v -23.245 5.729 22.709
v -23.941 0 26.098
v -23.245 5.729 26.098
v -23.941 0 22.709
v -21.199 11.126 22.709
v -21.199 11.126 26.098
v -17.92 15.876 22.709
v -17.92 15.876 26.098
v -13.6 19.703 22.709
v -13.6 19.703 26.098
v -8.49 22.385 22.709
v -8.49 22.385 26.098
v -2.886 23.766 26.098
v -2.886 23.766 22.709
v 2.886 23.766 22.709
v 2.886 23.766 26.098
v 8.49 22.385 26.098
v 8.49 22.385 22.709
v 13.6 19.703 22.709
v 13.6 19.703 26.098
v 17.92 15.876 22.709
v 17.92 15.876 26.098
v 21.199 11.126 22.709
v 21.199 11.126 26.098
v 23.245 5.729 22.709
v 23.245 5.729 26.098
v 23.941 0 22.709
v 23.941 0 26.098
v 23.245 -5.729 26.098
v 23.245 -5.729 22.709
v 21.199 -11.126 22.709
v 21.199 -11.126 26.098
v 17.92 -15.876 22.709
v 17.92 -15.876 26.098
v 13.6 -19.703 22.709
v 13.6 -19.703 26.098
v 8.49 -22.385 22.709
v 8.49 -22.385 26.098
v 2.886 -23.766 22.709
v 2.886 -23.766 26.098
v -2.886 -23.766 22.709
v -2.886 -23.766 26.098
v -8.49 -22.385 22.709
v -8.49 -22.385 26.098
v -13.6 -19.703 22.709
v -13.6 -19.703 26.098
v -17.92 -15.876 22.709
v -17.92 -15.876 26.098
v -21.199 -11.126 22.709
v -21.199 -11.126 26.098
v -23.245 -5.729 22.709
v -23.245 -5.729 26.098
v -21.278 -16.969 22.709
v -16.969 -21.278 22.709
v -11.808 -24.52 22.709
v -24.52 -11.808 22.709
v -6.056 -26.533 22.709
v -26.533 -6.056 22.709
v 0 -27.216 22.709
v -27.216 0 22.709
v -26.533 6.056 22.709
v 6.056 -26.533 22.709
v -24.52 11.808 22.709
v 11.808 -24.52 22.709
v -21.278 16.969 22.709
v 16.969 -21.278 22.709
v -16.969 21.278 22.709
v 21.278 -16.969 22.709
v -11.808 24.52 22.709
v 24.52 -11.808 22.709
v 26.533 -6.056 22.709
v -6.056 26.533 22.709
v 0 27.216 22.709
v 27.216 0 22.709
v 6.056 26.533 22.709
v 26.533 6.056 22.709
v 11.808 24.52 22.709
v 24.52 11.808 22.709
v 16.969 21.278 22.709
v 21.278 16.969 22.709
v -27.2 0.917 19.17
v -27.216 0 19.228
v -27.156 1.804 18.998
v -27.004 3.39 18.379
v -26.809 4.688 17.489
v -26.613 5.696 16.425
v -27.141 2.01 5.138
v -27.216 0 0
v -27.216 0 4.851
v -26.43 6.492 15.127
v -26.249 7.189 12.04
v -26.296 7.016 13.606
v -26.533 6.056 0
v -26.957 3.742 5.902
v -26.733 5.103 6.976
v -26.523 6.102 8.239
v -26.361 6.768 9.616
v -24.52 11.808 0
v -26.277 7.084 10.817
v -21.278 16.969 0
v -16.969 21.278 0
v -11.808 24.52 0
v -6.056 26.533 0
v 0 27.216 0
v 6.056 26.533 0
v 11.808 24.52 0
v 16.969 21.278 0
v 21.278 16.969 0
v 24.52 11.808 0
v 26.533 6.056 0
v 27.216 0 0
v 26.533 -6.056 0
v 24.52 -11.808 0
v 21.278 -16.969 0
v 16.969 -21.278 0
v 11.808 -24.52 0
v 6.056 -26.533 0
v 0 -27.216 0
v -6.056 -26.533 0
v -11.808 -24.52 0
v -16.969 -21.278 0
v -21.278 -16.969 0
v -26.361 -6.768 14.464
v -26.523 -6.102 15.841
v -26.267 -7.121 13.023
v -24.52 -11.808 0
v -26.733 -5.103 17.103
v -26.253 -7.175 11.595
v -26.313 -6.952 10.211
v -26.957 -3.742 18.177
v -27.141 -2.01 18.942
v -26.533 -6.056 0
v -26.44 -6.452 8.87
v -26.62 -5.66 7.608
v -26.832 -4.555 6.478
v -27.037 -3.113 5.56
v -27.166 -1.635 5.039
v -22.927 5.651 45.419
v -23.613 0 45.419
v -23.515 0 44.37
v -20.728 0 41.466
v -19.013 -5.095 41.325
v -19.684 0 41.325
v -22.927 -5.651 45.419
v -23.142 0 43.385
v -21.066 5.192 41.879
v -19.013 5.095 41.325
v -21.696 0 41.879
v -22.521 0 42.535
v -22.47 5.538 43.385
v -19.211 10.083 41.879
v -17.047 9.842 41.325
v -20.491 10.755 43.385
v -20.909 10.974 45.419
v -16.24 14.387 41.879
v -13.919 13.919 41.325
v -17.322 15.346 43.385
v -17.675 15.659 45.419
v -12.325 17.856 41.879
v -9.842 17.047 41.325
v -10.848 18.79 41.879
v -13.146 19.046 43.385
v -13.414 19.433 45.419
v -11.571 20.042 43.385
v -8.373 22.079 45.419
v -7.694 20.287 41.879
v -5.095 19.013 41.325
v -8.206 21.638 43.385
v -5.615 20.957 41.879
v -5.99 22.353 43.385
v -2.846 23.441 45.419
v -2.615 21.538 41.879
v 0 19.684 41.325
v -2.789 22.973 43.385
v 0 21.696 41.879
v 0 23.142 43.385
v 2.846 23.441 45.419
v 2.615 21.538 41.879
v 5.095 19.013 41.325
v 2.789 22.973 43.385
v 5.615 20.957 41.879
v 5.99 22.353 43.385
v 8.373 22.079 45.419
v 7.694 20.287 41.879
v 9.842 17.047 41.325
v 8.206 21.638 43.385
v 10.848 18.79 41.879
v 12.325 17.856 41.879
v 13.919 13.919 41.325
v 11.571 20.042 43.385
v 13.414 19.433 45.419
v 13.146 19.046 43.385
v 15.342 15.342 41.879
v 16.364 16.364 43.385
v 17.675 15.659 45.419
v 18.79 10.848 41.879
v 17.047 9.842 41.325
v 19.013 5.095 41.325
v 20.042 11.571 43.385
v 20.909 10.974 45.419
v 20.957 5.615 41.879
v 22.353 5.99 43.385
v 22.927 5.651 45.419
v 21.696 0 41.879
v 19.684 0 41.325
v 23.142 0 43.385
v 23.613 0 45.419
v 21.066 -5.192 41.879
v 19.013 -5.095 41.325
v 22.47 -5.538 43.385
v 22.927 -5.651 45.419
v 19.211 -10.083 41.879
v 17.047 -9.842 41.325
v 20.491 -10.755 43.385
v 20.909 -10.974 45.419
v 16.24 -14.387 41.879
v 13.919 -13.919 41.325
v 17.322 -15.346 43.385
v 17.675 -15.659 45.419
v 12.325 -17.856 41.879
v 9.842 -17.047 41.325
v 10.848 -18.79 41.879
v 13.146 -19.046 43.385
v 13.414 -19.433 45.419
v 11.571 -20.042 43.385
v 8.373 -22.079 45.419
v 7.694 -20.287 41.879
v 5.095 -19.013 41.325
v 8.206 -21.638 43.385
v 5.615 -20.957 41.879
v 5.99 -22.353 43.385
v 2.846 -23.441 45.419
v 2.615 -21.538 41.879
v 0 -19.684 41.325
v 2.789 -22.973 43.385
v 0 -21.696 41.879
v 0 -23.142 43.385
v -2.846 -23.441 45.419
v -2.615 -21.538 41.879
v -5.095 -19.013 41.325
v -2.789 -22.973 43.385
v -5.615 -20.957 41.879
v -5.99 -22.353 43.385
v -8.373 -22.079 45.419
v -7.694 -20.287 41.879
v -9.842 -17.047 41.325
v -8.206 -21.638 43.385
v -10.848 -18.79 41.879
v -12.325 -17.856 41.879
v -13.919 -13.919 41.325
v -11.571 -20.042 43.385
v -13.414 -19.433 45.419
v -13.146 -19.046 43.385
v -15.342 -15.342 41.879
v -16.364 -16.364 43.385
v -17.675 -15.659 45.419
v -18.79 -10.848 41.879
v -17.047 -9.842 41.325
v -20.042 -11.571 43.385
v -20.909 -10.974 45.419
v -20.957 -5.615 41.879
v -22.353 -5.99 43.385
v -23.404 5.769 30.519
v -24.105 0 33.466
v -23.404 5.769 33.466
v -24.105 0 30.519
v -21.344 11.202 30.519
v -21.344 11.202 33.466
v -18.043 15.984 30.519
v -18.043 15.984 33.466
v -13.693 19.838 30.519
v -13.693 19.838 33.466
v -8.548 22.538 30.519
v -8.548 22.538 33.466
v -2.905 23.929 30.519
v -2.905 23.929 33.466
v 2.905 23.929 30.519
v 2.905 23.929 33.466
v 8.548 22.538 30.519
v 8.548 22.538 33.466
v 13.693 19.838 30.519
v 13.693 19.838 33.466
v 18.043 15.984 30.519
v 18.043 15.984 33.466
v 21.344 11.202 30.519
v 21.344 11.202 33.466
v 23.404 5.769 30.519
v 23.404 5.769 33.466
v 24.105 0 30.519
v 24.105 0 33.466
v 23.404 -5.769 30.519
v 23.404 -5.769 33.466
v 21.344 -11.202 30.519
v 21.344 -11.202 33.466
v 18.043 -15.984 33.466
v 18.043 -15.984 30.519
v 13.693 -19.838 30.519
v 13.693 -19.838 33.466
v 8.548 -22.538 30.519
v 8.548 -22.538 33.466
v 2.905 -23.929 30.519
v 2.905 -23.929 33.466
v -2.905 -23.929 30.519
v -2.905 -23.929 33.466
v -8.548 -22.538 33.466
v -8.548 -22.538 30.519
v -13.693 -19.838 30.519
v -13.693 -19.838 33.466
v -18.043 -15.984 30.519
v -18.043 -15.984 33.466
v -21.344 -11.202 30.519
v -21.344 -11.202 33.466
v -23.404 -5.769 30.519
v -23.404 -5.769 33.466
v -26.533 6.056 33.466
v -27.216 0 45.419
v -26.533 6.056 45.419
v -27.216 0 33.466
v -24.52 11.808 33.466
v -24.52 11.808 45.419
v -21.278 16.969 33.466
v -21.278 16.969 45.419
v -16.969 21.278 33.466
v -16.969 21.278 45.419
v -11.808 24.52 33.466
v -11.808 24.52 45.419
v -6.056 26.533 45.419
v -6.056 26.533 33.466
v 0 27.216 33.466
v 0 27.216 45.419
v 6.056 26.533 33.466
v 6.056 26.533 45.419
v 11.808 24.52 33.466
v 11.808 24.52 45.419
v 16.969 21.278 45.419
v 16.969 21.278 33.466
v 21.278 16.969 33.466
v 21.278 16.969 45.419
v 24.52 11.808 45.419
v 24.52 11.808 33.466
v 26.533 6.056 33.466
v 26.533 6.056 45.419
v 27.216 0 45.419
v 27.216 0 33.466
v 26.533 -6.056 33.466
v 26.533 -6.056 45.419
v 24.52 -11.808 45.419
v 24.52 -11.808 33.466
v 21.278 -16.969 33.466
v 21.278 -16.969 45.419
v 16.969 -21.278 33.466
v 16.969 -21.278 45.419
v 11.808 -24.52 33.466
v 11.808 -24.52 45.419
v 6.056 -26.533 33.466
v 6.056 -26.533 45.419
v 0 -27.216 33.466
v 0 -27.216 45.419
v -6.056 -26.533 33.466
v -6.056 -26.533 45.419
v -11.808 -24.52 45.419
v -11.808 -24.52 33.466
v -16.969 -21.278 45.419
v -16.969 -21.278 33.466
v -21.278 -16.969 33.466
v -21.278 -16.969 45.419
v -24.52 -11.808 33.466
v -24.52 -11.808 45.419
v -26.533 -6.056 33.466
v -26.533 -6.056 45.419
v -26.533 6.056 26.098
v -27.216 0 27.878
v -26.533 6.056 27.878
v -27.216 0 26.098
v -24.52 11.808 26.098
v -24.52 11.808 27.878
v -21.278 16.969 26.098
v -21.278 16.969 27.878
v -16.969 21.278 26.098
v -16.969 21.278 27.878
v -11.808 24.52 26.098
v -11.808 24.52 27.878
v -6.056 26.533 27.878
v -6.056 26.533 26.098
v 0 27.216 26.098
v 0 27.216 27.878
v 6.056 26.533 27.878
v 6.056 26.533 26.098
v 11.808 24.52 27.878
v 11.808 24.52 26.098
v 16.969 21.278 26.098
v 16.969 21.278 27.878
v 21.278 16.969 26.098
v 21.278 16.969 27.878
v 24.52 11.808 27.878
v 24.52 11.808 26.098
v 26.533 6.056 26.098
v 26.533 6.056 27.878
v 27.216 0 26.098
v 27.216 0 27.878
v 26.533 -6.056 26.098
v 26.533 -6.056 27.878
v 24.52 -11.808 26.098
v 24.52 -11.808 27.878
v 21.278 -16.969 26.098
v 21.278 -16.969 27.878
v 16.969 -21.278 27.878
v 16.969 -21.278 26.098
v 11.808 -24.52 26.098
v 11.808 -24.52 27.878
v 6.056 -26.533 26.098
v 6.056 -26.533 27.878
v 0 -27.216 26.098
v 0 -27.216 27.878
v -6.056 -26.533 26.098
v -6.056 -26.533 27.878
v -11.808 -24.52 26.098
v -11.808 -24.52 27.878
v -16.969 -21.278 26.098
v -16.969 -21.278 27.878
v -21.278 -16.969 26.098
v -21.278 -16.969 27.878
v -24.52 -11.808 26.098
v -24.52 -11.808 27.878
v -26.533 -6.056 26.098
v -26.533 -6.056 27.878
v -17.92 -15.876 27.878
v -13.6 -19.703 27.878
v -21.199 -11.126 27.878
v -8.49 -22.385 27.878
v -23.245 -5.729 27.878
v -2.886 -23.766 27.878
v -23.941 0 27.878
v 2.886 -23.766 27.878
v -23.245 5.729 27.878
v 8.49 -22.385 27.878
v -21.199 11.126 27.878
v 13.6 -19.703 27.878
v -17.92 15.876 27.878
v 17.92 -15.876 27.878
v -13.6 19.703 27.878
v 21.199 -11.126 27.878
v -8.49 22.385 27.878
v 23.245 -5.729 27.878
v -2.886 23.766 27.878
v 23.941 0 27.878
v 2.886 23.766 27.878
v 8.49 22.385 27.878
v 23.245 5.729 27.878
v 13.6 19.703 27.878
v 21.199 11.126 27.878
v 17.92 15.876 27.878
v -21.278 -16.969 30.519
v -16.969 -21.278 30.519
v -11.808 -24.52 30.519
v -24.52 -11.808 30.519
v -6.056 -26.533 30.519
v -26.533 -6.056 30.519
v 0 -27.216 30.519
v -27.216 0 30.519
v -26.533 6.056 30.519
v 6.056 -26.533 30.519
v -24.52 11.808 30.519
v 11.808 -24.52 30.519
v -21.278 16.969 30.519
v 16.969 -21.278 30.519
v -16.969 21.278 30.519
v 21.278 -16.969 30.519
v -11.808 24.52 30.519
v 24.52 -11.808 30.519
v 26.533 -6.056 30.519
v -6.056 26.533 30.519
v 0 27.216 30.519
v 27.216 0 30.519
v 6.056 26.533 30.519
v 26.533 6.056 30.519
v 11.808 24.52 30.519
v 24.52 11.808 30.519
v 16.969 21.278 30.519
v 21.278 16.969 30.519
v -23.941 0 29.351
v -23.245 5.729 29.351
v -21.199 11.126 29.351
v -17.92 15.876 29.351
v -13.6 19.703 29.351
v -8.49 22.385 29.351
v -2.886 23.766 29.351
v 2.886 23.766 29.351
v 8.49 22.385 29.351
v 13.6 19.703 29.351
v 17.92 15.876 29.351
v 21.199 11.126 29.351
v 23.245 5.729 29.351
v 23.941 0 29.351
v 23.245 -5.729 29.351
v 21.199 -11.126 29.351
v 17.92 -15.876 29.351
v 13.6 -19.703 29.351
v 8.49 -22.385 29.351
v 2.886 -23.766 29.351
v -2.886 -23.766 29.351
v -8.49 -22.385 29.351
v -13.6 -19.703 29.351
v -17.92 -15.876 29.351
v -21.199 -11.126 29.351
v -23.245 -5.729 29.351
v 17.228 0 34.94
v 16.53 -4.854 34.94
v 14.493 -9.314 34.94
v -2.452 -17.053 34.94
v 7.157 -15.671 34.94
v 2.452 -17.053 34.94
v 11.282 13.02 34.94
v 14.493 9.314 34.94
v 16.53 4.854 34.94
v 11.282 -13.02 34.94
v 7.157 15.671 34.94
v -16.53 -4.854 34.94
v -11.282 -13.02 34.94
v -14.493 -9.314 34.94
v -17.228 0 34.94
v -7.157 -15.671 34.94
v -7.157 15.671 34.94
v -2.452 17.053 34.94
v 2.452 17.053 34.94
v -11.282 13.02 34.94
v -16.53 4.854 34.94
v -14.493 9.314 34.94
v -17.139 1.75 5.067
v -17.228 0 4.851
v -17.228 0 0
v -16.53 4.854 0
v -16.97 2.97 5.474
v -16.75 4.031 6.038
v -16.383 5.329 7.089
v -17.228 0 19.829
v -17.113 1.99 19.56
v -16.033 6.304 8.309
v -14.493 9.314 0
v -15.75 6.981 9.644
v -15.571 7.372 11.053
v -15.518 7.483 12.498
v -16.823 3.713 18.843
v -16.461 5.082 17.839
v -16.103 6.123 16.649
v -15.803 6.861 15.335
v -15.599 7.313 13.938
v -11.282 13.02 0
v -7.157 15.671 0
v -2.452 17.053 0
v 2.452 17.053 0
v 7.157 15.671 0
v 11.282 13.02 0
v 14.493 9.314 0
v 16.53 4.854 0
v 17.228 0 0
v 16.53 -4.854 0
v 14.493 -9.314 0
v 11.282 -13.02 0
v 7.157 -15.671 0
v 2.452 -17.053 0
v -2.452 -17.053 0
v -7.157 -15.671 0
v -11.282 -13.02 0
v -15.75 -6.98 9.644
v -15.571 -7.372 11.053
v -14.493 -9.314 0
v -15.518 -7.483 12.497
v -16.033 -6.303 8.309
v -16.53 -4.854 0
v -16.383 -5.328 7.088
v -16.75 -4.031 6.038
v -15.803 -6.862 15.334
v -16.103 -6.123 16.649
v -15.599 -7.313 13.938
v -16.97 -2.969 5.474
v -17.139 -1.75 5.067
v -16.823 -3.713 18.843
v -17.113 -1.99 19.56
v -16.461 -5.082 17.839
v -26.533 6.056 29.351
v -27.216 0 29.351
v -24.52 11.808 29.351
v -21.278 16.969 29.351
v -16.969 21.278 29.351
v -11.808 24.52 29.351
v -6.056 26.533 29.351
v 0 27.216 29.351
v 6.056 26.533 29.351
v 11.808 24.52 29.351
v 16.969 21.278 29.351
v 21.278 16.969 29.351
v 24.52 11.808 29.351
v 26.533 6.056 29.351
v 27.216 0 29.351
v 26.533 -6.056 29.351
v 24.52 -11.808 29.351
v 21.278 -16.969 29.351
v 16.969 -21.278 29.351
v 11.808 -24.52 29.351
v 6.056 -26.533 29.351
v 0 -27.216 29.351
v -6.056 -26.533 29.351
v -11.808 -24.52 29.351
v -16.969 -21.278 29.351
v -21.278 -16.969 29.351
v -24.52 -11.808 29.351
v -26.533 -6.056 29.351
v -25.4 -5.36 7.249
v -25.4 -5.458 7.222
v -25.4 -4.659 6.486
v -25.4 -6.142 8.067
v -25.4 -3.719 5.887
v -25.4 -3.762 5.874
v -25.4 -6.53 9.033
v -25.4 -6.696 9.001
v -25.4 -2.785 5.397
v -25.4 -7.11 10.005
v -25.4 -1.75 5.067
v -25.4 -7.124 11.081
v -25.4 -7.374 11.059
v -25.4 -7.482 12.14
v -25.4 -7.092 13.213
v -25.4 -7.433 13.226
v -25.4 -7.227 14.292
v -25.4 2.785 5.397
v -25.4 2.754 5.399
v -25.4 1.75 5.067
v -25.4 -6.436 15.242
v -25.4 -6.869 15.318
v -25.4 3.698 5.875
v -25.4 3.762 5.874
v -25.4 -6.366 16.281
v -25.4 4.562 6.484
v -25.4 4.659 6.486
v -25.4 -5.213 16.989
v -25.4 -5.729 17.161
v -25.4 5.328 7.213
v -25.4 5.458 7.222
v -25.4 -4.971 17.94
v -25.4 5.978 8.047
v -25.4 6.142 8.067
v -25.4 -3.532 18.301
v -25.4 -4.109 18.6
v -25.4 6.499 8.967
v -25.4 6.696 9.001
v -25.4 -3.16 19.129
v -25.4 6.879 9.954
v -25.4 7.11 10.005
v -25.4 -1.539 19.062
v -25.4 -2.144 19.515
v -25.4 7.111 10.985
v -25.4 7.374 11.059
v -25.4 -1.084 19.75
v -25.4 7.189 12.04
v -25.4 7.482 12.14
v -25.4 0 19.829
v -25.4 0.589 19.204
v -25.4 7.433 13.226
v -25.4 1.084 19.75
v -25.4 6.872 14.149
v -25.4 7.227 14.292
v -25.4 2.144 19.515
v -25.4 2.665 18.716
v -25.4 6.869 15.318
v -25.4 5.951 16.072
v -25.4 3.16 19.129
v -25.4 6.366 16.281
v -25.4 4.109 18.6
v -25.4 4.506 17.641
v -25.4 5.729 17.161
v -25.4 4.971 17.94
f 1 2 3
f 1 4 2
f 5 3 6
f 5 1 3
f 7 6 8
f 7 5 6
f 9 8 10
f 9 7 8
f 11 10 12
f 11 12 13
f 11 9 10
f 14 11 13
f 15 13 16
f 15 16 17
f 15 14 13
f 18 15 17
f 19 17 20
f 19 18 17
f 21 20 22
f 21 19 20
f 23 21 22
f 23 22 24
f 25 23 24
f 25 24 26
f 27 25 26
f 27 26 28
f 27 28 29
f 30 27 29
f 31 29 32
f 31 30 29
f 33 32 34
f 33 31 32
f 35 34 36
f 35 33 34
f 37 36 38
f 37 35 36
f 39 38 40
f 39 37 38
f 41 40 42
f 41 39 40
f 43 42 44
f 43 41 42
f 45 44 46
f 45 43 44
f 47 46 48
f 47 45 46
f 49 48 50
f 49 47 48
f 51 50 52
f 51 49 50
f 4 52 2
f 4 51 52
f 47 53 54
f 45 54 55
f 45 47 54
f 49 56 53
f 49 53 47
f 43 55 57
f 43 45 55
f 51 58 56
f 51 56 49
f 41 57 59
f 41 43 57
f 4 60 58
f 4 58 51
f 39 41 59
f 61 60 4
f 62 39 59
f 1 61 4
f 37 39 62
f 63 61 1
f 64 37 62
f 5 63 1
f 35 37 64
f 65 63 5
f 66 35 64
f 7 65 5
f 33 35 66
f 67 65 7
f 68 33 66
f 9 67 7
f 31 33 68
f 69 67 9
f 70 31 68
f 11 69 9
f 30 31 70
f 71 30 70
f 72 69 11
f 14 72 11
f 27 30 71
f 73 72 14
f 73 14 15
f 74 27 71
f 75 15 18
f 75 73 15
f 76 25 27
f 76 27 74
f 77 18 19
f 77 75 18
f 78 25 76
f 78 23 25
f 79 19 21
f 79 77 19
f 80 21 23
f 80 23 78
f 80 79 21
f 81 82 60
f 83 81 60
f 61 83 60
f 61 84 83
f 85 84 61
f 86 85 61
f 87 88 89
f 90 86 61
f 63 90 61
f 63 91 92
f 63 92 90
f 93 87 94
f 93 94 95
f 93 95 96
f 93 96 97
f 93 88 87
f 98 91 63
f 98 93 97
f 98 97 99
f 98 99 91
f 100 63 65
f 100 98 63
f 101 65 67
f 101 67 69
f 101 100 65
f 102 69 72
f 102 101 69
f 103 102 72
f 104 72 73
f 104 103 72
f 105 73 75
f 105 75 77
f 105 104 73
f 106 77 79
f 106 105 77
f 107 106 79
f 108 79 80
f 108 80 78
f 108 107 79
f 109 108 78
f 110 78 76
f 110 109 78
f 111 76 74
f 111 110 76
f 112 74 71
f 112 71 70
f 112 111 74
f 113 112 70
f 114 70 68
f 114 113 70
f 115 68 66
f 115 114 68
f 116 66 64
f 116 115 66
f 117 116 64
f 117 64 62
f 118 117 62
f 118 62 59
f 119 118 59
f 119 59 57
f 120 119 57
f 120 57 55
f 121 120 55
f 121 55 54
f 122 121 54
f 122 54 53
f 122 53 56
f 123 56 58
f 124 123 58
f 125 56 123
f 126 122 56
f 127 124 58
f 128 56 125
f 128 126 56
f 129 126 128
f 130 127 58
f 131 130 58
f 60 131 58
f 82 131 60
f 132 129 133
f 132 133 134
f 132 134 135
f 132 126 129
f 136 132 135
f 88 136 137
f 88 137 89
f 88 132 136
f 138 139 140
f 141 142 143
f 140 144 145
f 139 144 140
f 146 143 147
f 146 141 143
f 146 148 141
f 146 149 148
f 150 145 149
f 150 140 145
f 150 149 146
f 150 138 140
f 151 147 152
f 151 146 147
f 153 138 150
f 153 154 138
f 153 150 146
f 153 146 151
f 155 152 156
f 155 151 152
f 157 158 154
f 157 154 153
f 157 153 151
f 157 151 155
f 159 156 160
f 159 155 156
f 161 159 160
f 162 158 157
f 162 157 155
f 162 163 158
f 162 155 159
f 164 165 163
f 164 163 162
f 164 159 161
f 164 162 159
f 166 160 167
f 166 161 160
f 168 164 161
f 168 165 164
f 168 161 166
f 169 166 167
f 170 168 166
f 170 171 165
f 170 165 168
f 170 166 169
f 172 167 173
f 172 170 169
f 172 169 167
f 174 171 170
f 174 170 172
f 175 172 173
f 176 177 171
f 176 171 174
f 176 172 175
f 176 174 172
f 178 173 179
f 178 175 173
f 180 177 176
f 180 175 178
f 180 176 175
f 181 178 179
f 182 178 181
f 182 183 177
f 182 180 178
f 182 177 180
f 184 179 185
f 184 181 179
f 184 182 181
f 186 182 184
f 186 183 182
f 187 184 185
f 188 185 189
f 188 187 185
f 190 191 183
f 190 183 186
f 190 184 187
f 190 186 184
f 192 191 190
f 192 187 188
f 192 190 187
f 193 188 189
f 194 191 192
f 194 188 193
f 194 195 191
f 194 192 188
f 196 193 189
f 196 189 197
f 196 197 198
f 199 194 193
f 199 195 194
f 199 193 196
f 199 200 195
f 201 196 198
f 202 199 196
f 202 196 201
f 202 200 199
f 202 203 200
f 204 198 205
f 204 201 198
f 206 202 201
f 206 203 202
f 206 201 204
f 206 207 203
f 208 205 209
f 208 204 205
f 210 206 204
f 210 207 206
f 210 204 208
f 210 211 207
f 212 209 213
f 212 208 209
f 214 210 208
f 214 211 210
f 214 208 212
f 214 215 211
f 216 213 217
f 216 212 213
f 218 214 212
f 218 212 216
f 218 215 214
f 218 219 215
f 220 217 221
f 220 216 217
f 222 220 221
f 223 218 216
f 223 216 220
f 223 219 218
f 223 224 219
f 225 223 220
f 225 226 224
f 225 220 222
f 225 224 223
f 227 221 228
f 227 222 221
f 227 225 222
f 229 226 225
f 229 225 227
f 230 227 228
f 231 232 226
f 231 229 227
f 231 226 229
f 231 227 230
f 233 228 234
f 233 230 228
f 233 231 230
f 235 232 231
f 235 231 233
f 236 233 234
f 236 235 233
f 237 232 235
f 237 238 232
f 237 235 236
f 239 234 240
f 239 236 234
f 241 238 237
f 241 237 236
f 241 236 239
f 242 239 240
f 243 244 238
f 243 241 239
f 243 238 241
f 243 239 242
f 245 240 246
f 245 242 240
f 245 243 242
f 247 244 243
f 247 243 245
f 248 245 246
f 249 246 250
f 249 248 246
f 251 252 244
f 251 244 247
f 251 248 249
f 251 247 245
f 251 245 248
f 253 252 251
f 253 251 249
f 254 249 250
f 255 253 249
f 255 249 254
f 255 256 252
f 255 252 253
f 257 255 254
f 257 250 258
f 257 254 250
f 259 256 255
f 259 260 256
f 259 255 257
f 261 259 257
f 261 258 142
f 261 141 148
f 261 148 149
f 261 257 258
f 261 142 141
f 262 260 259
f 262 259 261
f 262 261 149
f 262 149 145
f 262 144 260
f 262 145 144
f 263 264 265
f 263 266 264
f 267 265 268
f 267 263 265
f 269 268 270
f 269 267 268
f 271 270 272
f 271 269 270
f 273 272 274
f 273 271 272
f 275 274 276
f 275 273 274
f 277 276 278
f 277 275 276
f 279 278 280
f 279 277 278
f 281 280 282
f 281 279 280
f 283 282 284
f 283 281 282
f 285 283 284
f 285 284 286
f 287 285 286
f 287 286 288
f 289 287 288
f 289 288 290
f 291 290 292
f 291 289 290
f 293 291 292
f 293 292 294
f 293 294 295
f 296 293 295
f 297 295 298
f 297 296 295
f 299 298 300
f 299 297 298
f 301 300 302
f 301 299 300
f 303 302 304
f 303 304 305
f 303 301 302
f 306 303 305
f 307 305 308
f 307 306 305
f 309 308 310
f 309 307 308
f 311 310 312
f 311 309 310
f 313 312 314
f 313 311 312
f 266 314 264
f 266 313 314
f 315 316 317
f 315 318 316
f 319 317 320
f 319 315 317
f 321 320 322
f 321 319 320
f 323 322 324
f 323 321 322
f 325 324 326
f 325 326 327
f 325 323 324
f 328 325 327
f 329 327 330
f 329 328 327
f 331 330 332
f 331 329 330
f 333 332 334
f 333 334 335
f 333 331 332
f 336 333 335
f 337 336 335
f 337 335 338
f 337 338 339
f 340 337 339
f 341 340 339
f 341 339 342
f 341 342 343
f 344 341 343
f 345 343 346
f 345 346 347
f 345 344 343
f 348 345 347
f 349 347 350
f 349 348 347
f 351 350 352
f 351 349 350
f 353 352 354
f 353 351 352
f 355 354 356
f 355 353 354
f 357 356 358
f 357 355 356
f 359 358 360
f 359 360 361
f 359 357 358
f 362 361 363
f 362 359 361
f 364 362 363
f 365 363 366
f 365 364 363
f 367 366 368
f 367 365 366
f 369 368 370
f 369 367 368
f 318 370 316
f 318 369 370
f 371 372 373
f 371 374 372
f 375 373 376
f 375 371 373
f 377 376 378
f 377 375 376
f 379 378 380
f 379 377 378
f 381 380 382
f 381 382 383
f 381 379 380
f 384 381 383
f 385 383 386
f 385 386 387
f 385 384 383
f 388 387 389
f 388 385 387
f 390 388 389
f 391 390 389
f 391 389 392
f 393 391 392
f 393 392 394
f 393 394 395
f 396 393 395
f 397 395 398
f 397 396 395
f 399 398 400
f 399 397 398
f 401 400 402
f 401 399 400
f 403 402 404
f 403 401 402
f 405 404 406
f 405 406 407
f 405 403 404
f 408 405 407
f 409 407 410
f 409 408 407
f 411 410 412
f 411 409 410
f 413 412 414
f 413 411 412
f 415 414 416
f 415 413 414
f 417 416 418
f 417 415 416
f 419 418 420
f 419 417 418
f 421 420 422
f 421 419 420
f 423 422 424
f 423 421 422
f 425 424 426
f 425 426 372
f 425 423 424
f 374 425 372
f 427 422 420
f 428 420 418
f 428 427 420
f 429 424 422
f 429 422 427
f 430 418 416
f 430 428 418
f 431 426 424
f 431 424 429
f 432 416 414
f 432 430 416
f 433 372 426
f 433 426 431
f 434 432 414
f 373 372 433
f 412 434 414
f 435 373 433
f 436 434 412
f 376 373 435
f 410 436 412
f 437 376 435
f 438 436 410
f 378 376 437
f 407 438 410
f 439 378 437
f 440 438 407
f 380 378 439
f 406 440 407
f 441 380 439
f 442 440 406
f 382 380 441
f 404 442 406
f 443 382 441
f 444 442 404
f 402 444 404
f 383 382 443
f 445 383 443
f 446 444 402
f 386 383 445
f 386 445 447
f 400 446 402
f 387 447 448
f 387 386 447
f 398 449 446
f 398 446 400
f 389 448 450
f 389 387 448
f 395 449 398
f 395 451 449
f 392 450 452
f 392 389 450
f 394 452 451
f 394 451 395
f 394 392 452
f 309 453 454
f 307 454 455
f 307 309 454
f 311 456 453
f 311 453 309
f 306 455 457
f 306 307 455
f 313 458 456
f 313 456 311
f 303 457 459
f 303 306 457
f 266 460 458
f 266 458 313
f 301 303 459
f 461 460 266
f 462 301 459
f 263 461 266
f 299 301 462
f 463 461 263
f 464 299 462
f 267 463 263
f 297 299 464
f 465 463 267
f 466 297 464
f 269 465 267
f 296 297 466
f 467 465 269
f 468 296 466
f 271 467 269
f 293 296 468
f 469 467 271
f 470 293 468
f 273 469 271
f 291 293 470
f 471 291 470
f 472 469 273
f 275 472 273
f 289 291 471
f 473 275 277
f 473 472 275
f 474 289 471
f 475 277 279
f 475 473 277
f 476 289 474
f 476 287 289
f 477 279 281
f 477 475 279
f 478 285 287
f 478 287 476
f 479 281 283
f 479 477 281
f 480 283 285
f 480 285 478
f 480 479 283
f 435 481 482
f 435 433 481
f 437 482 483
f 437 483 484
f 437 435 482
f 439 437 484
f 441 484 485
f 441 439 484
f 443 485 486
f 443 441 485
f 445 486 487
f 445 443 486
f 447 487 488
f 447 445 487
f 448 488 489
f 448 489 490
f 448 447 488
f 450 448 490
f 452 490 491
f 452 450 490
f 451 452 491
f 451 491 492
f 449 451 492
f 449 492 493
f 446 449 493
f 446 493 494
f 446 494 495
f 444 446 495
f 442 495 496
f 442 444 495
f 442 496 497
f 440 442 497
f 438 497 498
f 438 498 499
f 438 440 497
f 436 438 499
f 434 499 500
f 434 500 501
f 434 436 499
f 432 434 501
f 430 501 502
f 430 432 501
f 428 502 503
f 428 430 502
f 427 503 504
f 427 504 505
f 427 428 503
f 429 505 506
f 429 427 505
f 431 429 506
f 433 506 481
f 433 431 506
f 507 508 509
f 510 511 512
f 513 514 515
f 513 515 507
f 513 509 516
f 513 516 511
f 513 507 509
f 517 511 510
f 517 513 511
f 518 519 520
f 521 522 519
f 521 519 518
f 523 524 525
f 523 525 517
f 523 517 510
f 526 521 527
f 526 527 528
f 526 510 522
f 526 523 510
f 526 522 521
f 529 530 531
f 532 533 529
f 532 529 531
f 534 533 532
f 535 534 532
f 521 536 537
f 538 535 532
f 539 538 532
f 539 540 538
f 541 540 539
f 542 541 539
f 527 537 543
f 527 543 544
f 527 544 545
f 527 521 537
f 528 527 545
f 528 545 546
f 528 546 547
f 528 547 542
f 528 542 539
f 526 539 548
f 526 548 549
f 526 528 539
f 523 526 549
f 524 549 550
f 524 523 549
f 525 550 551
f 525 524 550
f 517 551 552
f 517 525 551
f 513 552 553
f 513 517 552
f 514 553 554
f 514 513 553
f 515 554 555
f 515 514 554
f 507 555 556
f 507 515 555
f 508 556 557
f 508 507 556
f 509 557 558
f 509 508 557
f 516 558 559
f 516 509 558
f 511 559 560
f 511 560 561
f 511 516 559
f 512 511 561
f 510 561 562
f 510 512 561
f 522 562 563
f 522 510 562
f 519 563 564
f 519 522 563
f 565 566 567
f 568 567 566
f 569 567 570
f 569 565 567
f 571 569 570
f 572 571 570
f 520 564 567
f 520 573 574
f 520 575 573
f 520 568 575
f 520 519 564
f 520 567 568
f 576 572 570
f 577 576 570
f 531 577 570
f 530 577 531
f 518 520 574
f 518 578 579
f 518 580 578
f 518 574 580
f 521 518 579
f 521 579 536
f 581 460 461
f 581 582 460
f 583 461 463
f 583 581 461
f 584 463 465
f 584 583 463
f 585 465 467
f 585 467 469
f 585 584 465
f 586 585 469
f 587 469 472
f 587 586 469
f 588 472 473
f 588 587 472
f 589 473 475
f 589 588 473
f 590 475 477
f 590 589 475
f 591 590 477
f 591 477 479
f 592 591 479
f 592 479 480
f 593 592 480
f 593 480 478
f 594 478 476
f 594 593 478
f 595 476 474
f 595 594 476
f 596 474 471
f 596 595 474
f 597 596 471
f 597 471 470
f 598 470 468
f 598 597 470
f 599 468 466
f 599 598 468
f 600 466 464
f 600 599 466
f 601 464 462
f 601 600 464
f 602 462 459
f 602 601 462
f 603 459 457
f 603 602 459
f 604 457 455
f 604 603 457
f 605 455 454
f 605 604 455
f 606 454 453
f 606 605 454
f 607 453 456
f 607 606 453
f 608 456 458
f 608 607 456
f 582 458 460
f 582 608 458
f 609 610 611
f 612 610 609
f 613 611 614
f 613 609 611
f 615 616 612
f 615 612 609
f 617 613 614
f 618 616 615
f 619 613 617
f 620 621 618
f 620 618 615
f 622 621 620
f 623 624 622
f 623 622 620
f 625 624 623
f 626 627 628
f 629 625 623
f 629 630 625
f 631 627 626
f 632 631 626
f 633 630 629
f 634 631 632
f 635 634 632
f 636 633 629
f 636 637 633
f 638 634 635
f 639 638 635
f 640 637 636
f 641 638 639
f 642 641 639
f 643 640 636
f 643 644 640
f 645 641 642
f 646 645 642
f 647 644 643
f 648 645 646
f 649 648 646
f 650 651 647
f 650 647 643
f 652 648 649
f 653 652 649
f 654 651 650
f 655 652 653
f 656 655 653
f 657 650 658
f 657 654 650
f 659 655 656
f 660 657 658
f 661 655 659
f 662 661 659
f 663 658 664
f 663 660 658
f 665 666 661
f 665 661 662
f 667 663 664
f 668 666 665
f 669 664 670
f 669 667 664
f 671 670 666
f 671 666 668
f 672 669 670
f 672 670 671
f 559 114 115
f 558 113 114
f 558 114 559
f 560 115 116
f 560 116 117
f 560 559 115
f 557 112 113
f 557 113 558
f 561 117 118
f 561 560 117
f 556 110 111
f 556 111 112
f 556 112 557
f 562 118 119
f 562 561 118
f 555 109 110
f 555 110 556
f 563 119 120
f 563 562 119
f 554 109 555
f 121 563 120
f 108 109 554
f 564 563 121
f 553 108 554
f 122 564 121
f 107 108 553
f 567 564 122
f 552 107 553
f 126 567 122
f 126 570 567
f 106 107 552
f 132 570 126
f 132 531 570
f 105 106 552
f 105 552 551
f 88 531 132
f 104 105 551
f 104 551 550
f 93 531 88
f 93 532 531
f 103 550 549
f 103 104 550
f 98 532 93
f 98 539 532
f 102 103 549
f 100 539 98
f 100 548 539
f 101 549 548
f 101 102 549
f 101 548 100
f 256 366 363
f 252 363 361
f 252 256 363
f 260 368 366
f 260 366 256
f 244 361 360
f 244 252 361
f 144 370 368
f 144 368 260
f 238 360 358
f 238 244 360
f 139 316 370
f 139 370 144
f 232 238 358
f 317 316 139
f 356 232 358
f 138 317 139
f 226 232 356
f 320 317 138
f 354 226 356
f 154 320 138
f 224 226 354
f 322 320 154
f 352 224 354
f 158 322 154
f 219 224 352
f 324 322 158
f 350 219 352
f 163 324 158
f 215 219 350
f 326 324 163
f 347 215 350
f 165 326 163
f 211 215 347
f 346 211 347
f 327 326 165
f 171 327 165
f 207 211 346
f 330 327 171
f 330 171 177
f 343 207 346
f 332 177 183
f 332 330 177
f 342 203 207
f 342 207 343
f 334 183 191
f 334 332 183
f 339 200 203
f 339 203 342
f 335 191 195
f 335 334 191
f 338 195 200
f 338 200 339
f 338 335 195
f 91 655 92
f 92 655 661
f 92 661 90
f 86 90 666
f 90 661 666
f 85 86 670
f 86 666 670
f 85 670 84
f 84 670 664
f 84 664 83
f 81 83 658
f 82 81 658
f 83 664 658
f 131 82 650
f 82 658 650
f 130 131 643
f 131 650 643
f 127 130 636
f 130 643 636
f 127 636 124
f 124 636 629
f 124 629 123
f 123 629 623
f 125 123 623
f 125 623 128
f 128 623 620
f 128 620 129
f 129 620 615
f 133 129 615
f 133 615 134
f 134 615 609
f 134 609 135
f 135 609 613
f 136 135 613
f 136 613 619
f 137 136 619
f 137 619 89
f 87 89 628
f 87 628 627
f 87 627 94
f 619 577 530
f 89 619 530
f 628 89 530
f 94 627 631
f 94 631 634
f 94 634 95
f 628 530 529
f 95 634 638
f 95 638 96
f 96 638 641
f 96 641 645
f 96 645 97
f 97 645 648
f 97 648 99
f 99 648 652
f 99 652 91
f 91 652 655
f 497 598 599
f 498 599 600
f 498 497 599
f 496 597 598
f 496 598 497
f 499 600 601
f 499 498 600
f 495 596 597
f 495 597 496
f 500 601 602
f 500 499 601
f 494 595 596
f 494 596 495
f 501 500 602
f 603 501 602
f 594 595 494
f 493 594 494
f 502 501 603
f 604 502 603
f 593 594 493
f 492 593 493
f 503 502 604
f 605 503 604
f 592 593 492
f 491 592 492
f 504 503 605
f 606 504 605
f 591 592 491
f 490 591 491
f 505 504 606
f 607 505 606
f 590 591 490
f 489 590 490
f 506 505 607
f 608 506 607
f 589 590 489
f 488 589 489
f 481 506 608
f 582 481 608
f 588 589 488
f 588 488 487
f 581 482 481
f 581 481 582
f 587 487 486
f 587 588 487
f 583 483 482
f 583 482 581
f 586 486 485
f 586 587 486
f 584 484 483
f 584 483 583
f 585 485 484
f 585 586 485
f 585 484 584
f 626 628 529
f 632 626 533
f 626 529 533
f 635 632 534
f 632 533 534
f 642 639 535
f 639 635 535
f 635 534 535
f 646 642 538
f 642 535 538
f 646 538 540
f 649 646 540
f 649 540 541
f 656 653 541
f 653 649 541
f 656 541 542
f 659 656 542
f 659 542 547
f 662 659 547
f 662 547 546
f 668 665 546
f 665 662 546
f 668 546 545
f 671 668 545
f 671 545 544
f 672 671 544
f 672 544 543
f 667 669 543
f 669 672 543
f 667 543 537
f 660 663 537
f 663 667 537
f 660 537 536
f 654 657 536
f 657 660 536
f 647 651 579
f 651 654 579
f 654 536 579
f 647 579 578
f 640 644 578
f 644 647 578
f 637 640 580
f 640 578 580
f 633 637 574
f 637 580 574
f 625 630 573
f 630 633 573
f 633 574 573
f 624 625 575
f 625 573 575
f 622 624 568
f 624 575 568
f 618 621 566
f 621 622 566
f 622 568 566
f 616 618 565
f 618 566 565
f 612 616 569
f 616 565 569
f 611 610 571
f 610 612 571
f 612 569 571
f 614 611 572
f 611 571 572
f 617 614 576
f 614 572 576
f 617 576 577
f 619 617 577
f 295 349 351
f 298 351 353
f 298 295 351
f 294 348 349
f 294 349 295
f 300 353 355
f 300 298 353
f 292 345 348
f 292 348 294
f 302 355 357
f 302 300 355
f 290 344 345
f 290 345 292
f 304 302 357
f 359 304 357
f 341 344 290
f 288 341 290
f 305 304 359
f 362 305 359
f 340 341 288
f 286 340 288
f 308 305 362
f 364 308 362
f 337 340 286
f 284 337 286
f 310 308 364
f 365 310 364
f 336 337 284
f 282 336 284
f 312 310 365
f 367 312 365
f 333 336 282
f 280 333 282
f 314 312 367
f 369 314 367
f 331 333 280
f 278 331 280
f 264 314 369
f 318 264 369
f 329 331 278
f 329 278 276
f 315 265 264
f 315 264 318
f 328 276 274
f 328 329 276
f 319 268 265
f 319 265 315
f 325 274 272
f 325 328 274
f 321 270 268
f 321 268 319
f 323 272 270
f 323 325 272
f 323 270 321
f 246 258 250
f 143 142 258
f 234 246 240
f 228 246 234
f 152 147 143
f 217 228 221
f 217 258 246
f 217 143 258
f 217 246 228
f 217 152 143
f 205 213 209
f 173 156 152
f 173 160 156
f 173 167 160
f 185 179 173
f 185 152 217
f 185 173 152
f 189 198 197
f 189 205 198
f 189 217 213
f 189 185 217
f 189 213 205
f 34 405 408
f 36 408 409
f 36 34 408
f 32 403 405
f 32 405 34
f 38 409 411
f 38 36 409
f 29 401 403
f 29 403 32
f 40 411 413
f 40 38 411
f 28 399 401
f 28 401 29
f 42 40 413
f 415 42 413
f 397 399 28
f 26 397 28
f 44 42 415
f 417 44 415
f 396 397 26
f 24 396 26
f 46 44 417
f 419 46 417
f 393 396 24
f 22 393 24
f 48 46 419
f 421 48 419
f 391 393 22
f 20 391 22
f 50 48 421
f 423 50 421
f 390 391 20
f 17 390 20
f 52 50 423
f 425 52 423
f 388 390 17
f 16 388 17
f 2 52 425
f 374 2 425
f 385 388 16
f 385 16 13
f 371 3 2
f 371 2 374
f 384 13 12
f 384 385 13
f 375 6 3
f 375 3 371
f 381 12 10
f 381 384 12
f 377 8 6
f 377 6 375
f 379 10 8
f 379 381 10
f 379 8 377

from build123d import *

# Parameters (mm, degrees)
F2_R     = 7.188692
F3_DEPTH = 127
F4_R     = 7.484689
F5_DEPTH = 25.4


with BuildPart() as f1:
    # F0 (on Front) → F1 (revolve)
    with BuildSketch(Plane.XZ):
        with BuildLine():
            Line((-27.215535, 0), (-17.227892, 0))
            Line((-17.227892, 0), (-17.227892, 34.93984))
            Line((-17.227892, 34.93984), (0, 34.93984))
            Line((0, 34.93984), (0, 41.325383))
            Line((0, 41.325383), (-19.68387, 41.325383))
            ThreePointArc((-19.68387, 41.325383), (-22.520971, 42.534607), (-23.613434, 45.418683))
            Line((-23.613434, 45.418683), (-27.215535, 45.418683))
            Line((-27.215535, 45.418683), (-27.215535, 33.466253))
            Line((-27.215535, 33.466253), (-24.104631, 33.466253))
            Line((-24.104631, 33.466253), (-24.104631, 30.519081))
            Line((-24.104631, 30.519081), (-27.215535, 30.519081))
            Line((-27.215535, 30.519081), (-27.215535, 29.350575))
            Line((-27.215535, 29.350575), (-23.940898, 29.350575))
            Line((-23.940898, 29.350575), (-23.940898, 27.878314))
            Line((-23.940898, 27.878314), (-27.215535, 27.878314))
            Line((-27.215535, 27.878314), (-27.215535, 26.098322))
            Line((-27.215535, 26.098322), (-23.940898, 26.098322))
            Line((-23.940898, 26.098322), (-23.940898, 22.709342))
            Line((-23.940898, 22.709342), (-27.215535, 22.709342))
            Line((-27.215535, 22.709342), (-27.215535, 0))
        make_face()
    revolve(axis=Axis((0, 0, 38.132612), (0, 0, -1)))

    # F2 (on Right) → F3 (cut)
    with BuildSketch(Plane.YZ):
        with Locations((0, 12.0396)):
            Circle(F2_R)
    extrude(amount=-F3_DEPTH, mode=Mode.SUBTRACT)

    # F4 (on Right) → F5 (cut)
    with BuildSketch(Plane.YZ):
        with Locations((0, 12.3444)):
            Circle(F4_R)
    extrude(amount=-F5_DEPTH, mode=Mode.SUBTRACT)


solid = f1.part
